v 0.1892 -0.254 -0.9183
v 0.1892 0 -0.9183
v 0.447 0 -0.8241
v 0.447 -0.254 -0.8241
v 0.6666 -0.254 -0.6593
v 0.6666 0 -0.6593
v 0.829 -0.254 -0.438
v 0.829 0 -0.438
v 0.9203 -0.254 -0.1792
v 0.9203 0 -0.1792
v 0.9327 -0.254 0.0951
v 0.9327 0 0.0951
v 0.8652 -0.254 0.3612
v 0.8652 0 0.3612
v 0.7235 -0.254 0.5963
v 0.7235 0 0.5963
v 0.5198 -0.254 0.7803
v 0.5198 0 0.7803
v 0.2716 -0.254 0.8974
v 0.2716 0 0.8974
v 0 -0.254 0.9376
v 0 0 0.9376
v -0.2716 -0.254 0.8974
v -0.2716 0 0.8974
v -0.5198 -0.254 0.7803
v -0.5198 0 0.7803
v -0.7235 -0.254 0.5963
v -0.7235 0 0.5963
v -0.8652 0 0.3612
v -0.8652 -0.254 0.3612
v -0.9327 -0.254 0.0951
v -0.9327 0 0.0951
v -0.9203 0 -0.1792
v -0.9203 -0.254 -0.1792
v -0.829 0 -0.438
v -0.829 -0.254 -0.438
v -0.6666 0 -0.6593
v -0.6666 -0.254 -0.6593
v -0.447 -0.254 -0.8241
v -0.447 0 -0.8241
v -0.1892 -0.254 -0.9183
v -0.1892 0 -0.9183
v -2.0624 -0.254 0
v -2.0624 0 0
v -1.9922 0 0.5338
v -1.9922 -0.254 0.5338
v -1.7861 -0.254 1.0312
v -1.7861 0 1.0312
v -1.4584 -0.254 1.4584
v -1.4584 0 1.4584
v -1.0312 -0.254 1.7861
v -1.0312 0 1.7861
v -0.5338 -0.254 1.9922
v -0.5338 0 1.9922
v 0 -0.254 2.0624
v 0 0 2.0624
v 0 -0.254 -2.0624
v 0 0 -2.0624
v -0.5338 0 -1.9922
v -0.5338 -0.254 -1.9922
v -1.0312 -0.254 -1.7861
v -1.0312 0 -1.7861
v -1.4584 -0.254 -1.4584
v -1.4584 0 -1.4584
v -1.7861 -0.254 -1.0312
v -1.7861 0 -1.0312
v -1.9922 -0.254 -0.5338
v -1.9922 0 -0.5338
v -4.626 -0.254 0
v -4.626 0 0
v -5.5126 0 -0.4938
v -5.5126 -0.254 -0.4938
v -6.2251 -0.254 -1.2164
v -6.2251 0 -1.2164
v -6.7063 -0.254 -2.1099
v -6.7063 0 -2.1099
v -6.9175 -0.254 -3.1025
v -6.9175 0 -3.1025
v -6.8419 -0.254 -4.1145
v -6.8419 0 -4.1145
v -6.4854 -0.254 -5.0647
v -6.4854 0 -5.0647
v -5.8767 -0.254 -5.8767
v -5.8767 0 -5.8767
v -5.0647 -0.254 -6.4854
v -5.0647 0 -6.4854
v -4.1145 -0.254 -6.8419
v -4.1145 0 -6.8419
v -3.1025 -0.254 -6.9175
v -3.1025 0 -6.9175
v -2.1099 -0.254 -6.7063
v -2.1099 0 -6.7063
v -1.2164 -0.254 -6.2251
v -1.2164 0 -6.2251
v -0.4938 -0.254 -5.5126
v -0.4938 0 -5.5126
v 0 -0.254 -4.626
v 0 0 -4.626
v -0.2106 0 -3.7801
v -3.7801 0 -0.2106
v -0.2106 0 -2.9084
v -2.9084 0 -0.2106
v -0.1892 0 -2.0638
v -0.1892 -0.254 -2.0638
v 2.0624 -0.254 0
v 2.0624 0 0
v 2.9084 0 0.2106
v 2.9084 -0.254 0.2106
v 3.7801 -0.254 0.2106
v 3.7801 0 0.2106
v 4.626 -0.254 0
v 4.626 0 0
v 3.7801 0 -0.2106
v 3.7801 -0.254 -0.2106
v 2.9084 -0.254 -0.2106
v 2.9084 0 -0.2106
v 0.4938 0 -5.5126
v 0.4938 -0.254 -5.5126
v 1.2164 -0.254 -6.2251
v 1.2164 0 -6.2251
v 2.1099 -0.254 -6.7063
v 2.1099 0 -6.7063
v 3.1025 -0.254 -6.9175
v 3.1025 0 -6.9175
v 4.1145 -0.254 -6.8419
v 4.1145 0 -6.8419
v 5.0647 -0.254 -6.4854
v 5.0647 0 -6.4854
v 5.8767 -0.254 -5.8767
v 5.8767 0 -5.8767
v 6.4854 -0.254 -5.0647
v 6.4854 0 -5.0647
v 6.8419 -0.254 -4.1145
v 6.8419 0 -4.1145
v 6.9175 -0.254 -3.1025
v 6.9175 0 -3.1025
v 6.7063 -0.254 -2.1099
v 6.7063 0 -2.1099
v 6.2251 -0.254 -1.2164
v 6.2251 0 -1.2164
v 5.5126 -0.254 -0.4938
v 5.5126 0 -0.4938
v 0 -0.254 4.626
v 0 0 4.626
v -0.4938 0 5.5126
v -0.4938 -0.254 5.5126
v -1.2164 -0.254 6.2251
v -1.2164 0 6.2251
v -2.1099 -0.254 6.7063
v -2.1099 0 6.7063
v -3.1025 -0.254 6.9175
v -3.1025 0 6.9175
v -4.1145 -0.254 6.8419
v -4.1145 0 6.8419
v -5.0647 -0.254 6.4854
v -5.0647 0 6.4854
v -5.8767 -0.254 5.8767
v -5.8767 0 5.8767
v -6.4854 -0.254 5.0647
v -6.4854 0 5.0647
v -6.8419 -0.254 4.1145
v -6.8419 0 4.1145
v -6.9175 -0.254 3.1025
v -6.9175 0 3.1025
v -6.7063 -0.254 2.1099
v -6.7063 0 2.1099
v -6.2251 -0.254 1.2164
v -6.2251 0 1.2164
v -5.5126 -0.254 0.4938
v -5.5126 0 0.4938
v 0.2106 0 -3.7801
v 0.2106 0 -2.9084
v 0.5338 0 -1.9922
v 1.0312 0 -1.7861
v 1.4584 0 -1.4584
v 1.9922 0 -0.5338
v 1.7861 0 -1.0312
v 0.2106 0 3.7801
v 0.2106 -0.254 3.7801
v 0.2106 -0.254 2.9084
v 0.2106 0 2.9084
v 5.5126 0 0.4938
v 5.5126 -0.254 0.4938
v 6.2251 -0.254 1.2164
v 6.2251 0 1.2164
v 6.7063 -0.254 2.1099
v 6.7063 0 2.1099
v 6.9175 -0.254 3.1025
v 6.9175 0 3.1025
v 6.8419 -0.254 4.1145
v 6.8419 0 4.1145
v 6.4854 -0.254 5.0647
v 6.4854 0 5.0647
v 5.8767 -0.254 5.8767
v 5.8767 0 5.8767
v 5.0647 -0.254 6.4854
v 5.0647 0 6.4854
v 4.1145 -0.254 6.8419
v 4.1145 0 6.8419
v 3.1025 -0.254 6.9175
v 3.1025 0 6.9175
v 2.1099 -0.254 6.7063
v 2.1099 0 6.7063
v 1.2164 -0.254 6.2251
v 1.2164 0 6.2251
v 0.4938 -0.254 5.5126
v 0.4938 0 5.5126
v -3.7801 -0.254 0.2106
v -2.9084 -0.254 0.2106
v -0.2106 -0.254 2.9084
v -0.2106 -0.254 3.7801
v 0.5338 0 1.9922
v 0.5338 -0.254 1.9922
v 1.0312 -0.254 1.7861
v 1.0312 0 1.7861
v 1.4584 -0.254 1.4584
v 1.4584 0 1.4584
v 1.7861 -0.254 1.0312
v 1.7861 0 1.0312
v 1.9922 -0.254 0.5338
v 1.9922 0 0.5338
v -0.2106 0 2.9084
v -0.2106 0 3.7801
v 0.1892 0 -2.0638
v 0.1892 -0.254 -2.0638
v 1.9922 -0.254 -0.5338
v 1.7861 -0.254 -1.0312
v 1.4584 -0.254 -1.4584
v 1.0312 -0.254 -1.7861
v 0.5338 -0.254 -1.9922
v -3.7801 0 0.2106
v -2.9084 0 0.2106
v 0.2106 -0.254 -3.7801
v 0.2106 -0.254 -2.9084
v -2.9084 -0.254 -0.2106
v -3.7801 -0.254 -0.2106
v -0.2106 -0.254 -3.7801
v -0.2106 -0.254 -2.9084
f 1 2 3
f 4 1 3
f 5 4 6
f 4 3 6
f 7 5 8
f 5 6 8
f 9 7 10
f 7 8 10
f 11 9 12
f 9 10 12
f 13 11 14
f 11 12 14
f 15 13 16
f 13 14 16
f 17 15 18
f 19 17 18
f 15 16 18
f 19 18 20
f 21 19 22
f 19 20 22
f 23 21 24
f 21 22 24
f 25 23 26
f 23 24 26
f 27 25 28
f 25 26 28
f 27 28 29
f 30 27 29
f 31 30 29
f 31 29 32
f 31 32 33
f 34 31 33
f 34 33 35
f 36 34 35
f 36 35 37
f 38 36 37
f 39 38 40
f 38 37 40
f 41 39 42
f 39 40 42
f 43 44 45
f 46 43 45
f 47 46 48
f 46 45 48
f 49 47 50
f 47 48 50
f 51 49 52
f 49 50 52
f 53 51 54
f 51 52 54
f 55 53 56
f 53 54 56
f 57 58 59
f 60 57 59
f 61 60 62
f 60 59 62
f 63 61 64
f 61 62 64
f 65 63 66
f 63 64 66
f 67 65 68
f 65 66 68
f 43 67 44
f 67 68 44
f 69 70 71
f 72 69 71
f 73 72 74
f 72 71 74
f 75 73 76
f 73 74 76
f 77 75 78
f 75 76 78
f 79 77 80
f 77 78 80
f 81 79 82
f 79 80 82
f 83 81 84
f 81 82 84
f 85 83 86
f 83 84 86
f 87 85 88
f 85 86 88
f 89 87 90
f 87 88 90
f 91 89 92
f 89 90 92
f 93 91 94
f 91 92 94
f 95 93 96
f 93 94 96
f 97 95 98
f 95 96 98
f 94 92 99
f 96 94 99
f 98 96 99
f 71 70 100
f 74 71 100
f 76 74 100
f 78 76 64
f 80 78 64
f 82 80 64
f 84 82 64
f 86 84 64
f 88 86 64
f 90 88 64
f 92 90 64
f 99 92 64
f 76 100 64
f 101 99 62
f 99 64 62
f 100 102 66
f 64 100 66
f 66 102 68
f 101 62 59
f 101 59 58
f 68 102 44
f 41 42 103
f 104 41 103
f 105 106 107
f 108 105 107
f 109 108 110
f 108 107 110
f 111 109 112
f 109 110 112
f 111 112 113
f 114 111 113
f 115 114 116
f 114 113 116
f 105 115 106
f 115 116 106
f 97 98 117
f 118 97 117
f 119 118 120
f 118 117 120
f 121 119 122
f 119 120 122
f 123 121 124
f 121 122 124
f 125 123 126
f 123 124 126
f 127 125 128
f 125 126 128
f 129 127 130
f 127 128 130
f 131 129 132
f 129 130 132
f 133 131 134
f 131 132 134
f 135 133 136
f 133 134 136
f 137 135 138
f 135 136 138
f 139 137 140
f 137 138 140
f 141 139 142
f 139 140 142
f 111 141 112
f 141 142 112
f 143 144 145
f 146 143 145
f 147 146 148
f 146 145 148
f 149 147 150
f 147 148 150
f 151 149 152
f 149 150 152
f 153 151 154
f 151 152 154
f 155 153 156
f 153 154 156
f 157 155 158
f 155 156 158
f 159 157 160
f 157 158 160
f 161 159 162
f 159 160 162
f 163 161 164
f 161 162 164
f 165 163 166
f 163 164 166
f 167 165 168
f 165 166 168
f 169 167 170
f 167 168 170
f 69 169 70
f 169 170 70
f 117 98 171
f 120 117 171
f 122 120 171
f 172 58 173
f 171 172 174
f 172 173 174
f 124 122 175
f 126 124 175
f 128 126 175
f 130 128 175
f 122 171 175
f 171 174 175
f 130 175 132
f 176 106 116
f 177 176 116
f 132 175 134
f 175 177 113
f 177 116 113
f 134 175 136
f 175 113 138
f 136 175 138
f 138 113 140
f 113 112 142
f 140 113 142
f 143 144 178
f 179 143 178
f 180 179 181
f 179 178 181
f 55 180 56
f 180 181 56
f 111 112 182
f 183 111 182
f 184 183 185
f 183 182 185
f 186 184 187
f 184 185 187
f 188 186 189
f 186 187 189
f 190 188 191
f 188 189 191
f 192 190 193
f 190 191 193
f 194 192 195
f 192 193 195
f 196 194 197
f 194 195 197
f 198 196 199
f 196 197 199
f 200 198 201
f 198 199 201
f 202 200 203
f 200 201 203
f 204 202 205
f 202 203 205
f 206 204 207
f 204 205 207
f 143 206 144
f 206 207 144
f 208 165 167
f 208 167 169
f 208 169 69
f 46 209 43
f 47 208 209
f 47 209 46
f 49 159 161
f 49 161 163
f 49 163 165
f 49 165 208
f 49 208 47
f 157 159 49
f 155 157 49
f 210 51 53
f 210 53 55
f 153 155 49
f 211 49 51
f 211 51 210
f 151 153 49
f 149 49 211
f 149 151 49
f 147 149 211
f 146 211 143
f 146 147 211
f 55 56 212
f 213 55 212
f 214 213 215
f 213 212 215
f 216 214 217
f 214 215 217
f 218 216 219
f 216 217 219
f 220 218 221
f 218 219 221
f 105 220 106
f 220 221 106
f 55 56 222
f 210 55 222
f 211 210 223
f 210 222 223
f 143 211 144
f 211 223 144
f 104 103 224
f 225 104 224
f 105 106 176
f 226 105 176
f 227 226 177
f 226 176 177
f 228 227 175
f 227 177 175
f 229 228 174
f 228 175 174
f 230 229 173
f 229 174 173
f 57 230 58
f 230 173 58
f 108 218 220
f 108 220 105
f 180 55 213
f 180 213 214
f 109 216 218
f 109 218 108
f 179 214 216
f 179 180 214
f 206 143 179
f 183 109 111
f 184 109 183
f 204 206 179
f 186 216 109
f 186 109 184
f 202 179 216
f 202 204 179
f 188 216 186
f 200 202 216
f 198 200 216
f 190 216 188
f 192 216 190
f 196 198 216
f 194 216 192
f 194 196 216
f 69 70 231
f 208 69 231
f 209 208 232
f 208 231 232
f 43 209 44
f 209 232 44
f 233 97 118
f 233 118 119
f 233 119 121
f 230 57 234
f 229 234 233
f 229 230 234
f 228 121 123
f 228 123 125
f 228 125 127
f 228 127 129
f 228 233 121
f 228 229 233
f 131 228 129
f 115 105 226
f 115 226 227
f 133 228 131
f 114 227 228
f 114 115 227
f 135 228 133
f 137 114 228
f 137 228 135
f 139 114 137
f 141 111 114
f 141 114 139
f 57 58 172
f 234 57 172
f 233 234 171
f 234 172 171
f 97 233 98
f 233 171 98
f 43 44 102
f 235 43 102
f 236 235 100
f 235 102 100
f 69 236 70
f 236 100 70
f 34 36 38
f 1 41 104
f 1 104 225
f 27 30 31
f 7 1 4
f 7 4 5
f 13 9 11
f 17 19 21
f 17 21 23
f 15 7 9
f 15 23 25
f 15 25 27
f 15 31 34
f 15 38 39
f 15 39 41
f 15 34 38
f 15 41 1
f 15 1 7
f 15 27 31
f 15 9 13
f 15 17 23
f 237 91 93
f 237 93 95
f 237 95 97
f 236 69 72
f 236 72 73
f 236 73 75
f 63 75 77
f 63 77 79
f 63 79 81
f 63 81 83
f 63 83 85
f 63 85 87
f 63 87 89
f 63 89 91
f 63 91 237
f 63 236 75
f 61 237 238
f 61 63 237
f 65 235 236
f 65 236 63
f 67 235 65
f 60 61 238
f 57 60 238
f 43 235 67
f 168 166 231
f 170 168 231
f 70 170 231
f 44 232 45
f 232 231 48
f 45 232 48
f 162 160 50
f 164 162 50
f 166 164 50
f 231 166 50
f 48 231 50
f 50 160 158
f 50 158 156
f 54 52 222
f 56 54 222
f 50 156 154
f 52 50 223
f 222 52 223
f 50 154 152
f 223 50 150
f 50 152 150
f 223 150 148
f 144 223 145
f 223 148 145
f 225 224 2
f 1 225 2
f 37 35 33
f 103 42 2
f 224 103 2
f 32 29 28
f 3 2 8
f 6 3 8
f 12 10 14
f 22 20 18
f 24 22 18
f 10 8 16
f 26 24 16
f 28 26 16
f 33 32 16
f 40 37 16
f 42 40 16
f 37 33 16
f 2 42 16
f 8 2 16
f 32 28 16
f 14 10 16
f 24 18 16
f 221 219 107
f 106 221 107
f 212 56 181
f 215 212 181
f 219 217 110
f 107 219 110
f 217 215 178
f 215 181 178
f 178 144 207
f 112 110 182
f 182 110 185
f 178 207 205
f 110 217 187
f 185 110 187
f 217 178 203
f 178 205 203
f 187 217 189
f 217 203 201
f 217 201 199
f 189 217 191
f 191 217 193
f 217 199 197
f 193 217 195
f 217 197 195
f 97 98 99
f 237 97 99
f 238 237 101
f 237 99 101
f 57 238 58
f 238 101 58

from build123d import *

# Parameters (mm, degrees)
F1_DEPTH = 0.254
F3_DEPTH = 0.254


with BuildPart() as f1:
    # F0 (on Front) → F1 (new body)
    with BuildSketch(Plane.XZ):
        with BuildLine():
            ThreePointArc((4.6260023192, 0), (3.3442261435, -0.2372258893), (2.0624499678, 0))
            ThreePointArc((2.0624499678, 0), (1.4583723581, -1.4583723581), (0, -2.0624499678))
            ThreePointArc((0, -2.0624499678), (0.2372258893, -3.3442261435), (0, -4.6260023192))
            ThreePointArc((0, -4.6260023192), (5.8766951624, -5.8766951624), (4.6260023192, 0))
        make_face()
    extrude(amount=F1_DEPTH)


with BuildPart() as f1b:
    # F0 (on Front) → F1, piece 2 (new body)
    with BuildSketch(Plane.XZ):
        with BuildLine():
            ThreePointArc((0, 2.0624499678), (1.4583723581, 1.4583723581), (2.0624499678, 0))
            ThreePointArc((2.0624499678, 0), (3.3442261435, 0.2372258893), (4.6260023192, 0))
            ThreePointArc((4.6260023192, 0), (5.8766951624, 5.8766951624), (0, 4.6260023192))
            ThreePointArc((0, 4.6260023192), (0.2372258893, 3.3442261435), (0, 2.0624499678))
        make_face()
    extrude(amount=F1_DEPTH)


with BuildPart() as f1c:
    # F0 (on Front) → F1, piece 3 (new body)
    with BuildSketch(Plane.XZ):
        with BuildLine():
            ThreePointArc((-2.0624499678, 0), (-1.4583723581, 1.4583723581), (0, 2.0624499678))
            ThreePointArc((0, 2.0624499678), (-0.2372258893, 3.3442261435), (0, 4.6260023192))
            ThreePointArc((0, 4.6260023192), (-5.8766951624, 5.8766951624), (-4.6260023192, 0))
            ThreePointArc((-4.6260023192, 0), (-3.3442261435, 0.2372258893), (-2.0624499678, 0))
        make_face()
    extrude(amount=F1_DEPTH)


with BuildPart() as f1d:
    # F0 (on Front) → F1, piece 4 (new body)
    with BuildSketch(Plane.XZ):
        with BuildLine():
            ThreePointArc((0, -4.6260023192), (-0.2372258893, -3.3442261435), (0, -2.0624499678))
            ThreePointArc((0, -2.0624499678), (-1.4583723581, -1.4583723581), (-2.0624499678, 0))
            ThreePointArc((-2.0624499678, 0), (-3.3442261435, -0.2372258893), (-4.6260023192, 0))
            ThreePointArc((-4.6260023192, 0), (-5.8766951624, -5.8766951624), (0, -4.6260023192))
        make_face()
    extrude(amount=F1_DEPTH)


with BuildPart() as f3:
    # F2 (on Front) → F3 (new body)
    with BuildSketch(Plane.XZ):
        with BuildLine():
            Line((0.1891683727, -2.0637542475), (0.1891683727, -0.918299452))
            ThreePointArc((0.1891683727, -0.918299452), (0, 0.9375812268), (-0.1891683727, -0.918299452))
            Line((-0.1891683727, -0.918299452), (-0.1891683727, -2.0637542475))
            Line((-0.1891683727, -2.0637542475), (0.1891683727, -2.0637542475))
        make_face()
    extrude(amount=F3_DEPTH)


solid = Compound([f1.part, f1b.part, f1c.part, f1d.part, f3.part])
